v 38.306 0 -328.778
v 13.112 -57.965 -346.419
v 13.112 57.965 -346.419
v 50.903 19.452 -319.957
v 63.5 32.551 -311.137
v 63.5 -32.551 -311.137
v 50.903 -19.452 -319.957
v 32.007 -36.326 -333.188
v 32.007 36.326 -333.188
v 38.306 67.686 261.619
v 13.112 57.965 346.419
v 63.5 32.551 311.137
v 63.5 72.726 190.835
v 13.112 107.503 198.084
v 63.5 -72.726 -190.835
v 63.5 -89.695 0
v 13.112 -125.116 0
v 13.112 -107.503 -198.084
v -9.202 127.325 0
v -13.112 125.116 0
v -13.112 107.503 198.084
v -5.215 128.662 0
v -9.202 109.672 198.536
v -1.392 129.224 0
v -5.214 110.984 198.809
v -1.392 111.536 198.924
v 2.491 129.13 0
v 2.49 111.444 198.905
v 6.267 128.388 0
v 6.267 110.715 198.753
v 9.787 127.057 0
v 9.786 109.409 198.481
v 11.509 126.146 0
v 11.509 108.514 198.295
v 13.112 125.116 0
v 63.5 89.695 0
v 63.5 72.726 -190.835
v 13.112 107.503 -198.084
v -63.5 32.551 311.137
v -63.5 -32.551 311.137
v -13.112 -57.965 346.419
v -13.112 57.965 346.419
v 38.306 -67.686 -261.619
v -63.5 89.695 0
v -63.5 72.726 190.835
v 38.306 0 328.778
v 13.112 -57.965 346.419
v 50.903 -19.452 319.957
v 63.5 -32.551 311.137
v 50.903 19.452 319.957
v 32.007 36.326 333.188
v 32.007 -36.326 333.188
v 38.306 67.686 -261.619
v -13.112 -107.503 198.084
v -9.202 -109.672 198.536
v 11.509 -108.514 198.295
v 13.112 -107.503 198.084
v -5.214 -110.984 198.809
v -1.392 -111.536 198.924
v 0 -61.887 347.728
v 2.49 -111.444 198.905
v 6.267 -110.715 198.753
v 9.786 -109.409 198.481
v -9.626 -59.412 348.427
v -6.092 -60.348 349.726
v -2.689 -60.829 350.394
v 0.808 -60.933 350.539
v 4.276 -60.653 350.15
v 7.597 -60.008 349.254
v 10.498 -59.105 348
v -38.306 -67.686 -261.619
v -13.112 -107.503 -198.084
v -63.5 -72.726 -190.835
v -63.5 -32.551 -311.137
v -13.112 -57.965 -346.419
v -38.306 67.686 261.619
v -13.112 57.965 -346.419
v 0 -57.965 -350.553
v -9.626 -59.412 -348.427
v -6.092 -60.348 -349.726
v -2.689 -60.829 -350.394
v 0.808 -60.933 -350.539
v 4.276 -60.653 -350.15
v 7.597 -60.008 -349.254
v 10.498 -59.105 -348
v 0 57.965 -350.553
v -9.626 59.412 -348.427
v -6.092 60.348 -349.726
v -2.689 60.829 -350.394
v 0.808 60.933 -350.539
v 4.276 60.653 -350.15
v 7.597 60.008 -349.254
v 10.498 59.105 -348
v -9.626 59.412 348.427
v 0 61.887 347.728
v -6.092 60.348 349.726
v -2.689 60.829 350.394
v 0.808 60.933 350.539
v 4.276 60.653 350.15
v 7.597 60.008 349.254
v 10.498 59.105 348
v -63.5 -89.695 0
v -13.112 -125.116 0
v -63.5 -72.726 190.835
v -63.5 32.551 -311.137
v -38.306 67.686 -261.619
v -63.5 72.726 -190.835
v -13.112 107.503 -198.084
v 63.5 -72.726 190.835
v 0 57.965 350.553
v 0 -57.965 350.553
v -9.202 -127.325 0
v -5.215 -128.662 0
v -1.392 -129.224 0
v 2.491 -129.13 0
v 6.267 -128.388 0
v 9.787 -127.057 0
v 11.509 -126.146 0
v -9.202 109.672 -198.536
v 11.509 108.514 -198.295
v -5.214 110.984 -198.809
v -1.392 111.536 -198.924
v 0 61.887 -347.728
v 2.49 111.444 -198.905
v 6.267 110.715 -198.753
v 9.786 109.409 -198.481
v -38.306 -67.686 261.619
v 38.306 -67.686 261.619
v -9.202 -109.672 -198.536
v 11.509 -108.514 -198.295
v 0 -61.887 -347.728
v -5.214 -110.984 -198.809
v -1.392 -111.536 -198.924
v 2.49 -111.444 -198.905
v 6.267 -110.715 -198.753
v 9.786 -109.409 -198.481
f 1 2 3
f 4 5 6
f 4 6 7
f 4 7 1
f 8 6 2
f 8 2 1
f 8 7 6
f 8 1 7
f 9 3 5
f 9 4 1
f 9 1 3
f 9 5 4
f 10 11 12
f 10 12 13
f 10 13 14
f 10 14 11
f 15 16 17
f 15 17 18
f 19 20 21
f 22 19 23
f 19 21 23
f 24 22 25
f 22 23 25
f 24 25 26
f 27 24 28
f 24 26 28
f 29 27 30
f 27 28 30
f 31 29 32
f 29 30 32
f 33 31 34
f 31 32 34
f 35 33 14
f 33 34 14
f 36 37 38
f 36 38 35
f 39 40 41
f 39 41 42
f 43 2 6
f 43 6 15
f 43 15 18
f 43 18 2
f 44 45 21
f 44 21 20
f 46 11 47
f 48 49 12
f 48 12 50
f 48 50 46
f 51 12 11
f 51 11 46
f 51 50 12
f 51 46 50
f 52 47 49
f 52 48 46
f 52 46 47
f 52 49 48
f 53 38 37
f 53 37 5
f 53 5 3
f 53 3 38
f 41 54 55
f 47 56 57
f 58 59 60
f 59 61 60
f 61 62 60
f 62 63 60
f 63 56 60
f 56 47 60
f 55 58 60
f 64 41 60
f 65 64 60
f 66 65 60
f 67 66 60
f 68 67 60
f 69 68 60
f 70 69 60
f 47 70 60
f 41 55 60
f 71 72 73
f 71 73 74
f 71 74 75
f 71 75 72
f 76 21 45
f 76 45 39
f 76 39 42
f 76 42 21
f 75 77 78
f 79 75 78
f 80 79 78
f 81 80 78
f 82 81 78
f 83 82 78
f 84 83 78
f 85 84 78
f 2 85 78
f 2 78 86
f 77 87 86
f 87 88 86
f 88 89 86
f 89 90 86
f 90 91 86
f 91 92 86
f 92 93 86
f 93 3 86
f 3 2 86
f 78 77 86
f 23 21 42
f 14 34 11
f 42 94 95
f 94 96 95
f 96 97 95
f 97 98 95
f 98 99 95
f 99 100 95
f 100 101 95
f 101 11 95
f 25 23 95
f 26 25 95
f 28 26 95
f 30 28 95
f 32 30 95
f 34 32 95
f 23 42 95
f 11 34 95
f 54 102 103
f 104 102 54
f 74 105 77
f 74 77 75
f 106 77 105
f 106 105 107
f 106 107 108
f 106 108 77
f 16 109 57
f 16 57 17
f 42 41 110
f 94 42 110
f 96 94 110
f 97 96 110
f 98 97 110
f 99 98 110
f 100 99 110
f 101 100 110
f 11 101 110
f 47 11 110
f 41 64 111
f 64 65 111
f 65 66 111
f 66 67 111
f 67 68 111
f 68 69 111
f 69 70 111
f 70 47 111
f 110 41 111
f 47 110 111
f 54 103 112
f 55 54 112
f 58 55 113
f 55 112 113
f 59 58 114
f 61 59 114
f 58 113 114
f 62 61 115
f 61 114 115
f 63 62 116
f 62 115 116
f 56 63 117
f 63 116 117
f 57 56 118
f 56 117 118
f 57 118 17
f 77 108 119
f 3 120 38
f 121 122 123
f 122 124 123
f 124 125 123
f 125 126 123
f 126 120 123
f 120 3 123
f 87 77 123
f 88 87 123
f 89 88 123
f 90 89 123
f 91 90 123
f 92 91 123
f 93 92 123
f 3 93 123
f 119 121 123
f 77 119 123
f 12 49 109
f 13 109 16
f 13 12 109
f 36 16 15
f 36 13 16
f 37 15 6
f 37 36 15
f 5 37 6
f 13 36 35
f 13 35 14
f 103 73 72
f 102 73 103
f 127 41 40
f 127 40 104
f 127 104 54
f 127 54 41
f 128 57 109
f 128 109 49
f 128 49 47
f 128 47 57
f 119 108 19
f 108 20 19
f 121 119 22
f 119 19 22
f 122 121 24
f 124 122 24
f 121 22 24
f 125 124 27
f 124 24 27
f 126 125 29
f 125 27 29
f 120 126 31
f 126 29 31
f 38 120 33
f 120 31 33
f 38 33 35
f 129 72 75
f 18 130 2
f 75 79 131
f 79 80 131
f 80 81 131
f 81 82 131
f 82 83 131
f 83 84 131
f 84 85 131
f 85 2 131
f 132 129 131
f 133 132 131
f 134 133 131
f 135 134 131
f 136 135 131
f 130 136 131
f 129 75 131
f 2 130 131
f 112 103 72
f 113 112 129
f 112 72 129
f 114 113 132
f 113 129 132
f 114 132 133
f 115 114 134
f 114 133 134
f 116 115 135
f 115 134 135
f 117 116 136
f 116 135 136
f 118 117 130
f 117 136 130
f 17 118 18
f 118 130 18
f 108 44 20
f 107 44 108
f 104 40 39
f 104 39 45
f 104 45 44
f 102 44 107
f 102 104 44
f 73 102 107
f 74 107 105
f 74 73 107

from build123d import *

# Parameters (mm, degrees)
BOSS_EXTRUDE1_DEPTH = 63.5
BOSS_EXTRUDE1_TAPER = 35
BOSS_EXTRUDE2_DEPTH = 63.5
BOSS_EXTRUDE2_TAPER = 35
FILLET1_R           = 22.86


with BuildPart() as part:
    # Sketch2 → Boss-Extrude1 (new body)
    with BuildSketch(Plane(origin=(0, 0, 0), x_dir=(0, 0, -1), z_dir=(1, 0, 0))):
        Polygon((-355.6, -64.578911313), (-199.970092798, -116.552688172), (0, -134.333703051), (199.970092798, -116.552688172), (355.6, -64.578911313), (355.6, 64.578911313), (199.970092798, 116.552688172), (0, 134.333703051), (-199.970092798, 116.552688172), (-355.6, 64.578911313), align=None)
    extrude(amount=BOSS_EXTRUDE1_DEPTH, taper=BOSS_EXTRUDE1_TAPER)

    # Sketch3 → Boss-Extrude2 (add)
    with BuildSketch(Plane.ZY):
        Polygon((0, 134.333703051), (-199.970092798, 116.552688172), (-355.6, 64.578911313), (-355.6, -64.578911313), (-199.970092798, -116.552688172), (0, -134.333703051), (199.970092798, -116.552688172), (355.6, -64.578911313), (355.6, 64.578911313), (199.970092798, 116.552688172), align=None)
    extrude(amount=BOSS_EXTRUDE2_DEPTH, taper=BOSS_EXTRUDE2_TAPER)

    # Fillet1
    fillet1_edges = [part.edges().sort_by_distance(p)[0] for p in [
        (0, 90.565799742, -277.785046399),
        (0, 0, -355.6),
        (0, -90.565799742, -277.785046399),
        (0, -125.443195612, -99.985046399),
        (0, -125.443195612, 99.985046399),
        (0, -90.565799742, 277.785046399),
        (0, 0, 355.6),
        (0, 90.565799742, 277.785046399),
        (0, 125.443195612, 99.985046399),
        (0, 125.443195612, -99.985046399),
    ]]
    fillet(fillet1_edges, radius=FILLET1_R)


solid = part.part
